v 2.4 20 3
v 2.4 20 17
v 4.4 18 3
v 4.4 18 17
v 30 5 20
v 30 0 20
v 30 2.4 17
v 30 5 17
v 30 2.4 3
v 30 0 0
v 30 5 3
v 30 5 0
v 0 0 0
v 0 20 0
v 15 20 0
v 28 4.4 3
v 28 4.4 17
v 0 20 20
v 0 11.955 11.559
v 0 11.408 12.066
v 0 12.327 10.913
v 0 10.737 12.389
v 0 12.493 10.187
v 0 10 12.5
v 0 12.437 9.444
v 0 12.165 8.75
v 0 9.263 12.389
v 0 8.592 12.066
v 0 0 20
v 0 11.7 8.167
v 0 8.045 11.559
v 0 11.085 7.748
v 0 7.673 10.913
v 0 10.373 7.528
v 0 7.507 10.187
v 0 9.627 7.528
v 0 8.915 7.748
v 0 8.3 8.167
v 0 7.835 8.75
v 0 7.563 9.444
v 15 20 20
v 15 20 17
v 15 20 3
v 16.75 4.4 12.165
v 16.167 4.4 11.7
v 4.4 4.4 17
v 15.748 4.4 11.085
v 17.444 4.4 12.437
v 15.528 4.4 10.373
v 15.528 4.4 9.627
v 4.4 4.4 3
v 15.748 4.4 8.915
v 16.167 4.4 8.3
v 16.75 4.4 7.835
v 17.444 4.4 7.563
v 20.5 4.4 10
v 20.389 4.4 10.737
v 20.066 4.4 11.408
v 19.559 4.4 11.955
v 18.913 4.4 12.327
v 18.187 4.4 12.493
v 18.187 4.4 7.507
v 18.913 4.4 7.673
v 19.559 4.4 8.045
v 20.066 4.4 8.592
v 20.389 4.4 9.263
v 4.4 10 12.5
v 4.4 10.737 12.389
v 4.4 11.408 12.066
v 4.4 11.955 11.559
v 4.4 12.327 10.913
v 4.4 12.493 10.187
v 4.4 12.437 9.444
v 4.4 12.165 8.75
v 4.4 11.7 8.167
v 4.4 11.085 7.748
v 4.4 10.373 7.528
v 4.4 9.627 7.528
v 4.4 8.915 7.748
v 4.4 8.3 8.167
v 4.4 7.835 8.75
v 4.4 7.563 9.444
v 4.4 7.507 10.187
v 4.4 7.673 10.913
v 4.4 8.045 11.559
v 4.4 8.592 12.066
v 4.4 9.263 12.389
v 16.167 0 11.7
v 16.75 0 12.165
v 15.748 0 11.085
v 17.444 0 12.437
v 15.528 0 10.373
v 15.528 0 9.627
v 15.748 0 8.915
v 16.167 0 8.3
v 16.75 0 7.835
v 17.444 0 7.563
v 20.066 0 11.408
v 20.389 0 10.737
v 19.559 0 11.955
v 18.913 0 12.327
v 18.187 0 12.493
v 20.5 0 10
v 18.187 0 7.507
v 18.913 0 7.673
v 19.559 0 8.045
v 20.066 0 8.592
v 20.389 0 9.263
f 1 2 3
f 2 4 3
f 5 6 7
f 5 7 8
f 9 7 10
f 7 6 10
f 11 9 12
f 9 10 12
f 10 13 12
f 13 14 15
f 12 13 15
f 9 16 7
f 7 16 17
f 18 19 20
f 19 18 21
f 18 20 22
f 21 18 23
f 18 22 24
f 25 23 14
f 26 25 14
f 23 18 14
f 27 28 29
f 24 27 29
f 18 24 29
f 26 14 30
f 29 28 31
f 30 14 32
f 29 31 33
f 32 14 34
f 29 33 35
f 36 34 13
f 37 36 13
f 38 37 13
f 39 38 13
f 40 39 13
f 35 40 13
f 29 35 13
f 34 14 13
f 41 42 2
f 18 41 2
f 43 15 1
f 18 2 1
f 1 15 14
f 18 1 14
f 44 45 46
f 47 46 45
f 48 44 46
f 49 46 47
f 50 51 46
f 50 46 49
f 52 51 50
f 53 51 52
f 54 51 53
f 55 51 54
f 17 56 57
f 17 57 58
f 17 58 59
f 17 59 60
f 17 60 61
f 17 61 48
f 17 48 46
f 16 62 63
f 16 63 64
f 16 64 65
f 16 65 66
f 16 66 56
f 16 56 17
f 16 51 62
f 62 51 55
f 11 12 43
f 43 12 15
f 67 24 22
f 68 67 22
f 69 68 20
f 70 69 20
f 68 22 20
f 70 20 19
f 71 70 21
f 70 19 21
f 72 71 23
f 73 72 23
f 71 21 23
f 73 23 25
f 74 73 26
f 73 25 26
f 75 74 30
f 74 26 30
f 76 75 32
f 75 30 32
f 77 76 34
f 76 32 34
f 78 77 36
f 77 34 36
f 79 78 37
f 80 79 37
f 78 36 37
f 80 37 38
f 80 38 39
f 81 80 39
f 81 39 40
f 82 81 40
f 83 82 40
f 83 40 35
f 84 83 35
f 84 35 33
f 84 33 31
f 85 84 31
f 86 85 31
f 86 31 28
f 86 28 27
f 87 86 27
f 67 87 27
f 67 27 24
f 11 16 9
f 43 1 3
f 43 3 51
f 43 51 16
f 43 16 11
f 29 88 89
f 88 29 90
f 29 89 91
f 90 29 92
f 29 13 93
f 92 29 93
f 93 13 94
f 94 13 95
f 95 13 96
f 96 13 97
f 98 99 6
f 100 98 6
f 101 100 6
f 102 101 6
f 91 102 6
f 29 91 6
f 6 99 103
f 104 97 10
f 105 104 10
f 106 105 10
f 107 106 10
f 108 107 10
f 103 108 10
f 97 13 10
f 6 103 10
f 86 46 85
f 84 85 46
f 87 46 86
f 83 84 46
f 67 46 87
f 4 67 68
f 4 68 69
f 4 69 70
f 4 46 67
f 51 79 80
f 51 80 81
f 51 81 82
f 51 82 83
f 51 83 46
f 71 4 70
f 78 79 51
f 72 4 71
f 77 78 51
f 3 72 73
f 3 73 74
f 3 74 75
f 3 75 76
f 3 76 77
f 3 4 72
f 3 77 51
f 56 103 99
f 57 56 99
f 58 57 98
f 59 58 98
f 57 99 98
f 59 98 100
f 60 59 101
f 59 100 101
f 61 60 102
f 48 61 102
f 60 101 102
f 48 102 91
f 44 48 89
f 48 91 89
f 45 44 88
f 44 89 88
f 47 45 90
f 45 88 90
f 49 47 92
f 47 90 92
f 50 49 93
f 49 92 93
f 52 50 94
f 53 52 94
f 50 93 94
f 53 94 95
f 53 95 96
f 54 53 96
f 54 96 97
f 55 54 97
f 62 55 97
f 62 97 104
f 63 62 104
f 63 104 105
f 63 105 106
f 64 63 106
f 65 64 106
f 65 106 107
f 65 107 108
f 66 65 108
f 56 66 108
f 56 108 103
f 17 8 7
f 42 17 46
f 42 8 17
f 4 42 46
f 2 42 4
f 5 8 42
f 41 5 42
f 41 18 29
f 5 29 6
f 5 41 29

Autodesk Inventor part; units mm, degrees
ref_plane "YZ Plane" through (0, 0, 0) normal (1, 0, 0) x (0, 1, 0)
ref_plane "XZ Plane" through (0, 0, 0) normal (0, 1, 0) x (-1, 0, 0)
ref_plane "XY Plane" through (0, 0, 0) normal (0, 0, 1) x (1, 0, 0)
sketch "スケッチ1" plane through (0, 0, 0) normal (0, 0, 1) x (1, 0, 0)
  line L0 (0, 0) -> (30, 0)
  line L1 (30, 0) -> (30, 5)
  line L2 (30, 5) -> (15, 20)
  line L3 (15, 20) -> (0, 20)
  line L4 (0, 20) -> (0, 0)
  dimension "d0" = 20
  dimension "d1" = 30
  dimension "d2" = 15
  dimension "d3" = 5
extrude "押し出し1" add sketch "スケッチ1" along normal blind 20
sketch "スケッチ2" plane through (0, 20, 0) normal (0, 1, 0) x (1, 0, 0)
  line L0 (4.4, -3) -> (30, -3)
  line L1 (30, -3) -> (30, -17)
  line L2 (30, -17) -> (4.4, -17)
  line L3 (4.4, -17) -> (4.4, -3)
  line L4 (15, 0) -> (0, 0) projected
  line L5 (15, -20) -> (0, -20) projected
  line L6 (0, 0) -> (0, -20) projected
  line L7 (30, 0) -> (30, -20) projected
  dimension "d7" = 3
  dimension "d8" = 3
  dimension "d9" = 4.4
extrude "押し出し2" cut sketch "スケッチ2" against normal blind 15.6
chamfer "面取り1" distance 2 angle 45 2 edges at (4.4, 20, 10) (30, 4.4, 10)
sketch "スケッチ3" plane through (0, 0, 0) normal (-1, 0, 0) x (0, 0, 1)
  line L0 (0, 0) -> (20, 0) construction
  line L1 (10, 0) -> (10, 20) construction
  line L2 (0, 20) -> (20, 20) construction
  line L3 (0, 5) -> (0, 20) construction
  circle A0 centre (10, 10) radius 2.5
  dimension "d15" = 5
extrude "押し出し3" cut sketch "スケッチ3" against normal through all
sketch "スケッチ4" plane through (0, 0, 0) normal (0, -1, 0) x (1, 0, 0)
  line L0 (30, 0) -> (30, 20) construction
  line L1 (30, 10) -> (0, 10) construction
  circle A0 centre (18, 10) radius 2.5
  point P0 (0, 0)
  dimension "d18" = 5
  dimension "d19" = 12
extrude "押し出し4" cut sketch "スケッチ4" against normal up to next
properties part number "ブラケット"
